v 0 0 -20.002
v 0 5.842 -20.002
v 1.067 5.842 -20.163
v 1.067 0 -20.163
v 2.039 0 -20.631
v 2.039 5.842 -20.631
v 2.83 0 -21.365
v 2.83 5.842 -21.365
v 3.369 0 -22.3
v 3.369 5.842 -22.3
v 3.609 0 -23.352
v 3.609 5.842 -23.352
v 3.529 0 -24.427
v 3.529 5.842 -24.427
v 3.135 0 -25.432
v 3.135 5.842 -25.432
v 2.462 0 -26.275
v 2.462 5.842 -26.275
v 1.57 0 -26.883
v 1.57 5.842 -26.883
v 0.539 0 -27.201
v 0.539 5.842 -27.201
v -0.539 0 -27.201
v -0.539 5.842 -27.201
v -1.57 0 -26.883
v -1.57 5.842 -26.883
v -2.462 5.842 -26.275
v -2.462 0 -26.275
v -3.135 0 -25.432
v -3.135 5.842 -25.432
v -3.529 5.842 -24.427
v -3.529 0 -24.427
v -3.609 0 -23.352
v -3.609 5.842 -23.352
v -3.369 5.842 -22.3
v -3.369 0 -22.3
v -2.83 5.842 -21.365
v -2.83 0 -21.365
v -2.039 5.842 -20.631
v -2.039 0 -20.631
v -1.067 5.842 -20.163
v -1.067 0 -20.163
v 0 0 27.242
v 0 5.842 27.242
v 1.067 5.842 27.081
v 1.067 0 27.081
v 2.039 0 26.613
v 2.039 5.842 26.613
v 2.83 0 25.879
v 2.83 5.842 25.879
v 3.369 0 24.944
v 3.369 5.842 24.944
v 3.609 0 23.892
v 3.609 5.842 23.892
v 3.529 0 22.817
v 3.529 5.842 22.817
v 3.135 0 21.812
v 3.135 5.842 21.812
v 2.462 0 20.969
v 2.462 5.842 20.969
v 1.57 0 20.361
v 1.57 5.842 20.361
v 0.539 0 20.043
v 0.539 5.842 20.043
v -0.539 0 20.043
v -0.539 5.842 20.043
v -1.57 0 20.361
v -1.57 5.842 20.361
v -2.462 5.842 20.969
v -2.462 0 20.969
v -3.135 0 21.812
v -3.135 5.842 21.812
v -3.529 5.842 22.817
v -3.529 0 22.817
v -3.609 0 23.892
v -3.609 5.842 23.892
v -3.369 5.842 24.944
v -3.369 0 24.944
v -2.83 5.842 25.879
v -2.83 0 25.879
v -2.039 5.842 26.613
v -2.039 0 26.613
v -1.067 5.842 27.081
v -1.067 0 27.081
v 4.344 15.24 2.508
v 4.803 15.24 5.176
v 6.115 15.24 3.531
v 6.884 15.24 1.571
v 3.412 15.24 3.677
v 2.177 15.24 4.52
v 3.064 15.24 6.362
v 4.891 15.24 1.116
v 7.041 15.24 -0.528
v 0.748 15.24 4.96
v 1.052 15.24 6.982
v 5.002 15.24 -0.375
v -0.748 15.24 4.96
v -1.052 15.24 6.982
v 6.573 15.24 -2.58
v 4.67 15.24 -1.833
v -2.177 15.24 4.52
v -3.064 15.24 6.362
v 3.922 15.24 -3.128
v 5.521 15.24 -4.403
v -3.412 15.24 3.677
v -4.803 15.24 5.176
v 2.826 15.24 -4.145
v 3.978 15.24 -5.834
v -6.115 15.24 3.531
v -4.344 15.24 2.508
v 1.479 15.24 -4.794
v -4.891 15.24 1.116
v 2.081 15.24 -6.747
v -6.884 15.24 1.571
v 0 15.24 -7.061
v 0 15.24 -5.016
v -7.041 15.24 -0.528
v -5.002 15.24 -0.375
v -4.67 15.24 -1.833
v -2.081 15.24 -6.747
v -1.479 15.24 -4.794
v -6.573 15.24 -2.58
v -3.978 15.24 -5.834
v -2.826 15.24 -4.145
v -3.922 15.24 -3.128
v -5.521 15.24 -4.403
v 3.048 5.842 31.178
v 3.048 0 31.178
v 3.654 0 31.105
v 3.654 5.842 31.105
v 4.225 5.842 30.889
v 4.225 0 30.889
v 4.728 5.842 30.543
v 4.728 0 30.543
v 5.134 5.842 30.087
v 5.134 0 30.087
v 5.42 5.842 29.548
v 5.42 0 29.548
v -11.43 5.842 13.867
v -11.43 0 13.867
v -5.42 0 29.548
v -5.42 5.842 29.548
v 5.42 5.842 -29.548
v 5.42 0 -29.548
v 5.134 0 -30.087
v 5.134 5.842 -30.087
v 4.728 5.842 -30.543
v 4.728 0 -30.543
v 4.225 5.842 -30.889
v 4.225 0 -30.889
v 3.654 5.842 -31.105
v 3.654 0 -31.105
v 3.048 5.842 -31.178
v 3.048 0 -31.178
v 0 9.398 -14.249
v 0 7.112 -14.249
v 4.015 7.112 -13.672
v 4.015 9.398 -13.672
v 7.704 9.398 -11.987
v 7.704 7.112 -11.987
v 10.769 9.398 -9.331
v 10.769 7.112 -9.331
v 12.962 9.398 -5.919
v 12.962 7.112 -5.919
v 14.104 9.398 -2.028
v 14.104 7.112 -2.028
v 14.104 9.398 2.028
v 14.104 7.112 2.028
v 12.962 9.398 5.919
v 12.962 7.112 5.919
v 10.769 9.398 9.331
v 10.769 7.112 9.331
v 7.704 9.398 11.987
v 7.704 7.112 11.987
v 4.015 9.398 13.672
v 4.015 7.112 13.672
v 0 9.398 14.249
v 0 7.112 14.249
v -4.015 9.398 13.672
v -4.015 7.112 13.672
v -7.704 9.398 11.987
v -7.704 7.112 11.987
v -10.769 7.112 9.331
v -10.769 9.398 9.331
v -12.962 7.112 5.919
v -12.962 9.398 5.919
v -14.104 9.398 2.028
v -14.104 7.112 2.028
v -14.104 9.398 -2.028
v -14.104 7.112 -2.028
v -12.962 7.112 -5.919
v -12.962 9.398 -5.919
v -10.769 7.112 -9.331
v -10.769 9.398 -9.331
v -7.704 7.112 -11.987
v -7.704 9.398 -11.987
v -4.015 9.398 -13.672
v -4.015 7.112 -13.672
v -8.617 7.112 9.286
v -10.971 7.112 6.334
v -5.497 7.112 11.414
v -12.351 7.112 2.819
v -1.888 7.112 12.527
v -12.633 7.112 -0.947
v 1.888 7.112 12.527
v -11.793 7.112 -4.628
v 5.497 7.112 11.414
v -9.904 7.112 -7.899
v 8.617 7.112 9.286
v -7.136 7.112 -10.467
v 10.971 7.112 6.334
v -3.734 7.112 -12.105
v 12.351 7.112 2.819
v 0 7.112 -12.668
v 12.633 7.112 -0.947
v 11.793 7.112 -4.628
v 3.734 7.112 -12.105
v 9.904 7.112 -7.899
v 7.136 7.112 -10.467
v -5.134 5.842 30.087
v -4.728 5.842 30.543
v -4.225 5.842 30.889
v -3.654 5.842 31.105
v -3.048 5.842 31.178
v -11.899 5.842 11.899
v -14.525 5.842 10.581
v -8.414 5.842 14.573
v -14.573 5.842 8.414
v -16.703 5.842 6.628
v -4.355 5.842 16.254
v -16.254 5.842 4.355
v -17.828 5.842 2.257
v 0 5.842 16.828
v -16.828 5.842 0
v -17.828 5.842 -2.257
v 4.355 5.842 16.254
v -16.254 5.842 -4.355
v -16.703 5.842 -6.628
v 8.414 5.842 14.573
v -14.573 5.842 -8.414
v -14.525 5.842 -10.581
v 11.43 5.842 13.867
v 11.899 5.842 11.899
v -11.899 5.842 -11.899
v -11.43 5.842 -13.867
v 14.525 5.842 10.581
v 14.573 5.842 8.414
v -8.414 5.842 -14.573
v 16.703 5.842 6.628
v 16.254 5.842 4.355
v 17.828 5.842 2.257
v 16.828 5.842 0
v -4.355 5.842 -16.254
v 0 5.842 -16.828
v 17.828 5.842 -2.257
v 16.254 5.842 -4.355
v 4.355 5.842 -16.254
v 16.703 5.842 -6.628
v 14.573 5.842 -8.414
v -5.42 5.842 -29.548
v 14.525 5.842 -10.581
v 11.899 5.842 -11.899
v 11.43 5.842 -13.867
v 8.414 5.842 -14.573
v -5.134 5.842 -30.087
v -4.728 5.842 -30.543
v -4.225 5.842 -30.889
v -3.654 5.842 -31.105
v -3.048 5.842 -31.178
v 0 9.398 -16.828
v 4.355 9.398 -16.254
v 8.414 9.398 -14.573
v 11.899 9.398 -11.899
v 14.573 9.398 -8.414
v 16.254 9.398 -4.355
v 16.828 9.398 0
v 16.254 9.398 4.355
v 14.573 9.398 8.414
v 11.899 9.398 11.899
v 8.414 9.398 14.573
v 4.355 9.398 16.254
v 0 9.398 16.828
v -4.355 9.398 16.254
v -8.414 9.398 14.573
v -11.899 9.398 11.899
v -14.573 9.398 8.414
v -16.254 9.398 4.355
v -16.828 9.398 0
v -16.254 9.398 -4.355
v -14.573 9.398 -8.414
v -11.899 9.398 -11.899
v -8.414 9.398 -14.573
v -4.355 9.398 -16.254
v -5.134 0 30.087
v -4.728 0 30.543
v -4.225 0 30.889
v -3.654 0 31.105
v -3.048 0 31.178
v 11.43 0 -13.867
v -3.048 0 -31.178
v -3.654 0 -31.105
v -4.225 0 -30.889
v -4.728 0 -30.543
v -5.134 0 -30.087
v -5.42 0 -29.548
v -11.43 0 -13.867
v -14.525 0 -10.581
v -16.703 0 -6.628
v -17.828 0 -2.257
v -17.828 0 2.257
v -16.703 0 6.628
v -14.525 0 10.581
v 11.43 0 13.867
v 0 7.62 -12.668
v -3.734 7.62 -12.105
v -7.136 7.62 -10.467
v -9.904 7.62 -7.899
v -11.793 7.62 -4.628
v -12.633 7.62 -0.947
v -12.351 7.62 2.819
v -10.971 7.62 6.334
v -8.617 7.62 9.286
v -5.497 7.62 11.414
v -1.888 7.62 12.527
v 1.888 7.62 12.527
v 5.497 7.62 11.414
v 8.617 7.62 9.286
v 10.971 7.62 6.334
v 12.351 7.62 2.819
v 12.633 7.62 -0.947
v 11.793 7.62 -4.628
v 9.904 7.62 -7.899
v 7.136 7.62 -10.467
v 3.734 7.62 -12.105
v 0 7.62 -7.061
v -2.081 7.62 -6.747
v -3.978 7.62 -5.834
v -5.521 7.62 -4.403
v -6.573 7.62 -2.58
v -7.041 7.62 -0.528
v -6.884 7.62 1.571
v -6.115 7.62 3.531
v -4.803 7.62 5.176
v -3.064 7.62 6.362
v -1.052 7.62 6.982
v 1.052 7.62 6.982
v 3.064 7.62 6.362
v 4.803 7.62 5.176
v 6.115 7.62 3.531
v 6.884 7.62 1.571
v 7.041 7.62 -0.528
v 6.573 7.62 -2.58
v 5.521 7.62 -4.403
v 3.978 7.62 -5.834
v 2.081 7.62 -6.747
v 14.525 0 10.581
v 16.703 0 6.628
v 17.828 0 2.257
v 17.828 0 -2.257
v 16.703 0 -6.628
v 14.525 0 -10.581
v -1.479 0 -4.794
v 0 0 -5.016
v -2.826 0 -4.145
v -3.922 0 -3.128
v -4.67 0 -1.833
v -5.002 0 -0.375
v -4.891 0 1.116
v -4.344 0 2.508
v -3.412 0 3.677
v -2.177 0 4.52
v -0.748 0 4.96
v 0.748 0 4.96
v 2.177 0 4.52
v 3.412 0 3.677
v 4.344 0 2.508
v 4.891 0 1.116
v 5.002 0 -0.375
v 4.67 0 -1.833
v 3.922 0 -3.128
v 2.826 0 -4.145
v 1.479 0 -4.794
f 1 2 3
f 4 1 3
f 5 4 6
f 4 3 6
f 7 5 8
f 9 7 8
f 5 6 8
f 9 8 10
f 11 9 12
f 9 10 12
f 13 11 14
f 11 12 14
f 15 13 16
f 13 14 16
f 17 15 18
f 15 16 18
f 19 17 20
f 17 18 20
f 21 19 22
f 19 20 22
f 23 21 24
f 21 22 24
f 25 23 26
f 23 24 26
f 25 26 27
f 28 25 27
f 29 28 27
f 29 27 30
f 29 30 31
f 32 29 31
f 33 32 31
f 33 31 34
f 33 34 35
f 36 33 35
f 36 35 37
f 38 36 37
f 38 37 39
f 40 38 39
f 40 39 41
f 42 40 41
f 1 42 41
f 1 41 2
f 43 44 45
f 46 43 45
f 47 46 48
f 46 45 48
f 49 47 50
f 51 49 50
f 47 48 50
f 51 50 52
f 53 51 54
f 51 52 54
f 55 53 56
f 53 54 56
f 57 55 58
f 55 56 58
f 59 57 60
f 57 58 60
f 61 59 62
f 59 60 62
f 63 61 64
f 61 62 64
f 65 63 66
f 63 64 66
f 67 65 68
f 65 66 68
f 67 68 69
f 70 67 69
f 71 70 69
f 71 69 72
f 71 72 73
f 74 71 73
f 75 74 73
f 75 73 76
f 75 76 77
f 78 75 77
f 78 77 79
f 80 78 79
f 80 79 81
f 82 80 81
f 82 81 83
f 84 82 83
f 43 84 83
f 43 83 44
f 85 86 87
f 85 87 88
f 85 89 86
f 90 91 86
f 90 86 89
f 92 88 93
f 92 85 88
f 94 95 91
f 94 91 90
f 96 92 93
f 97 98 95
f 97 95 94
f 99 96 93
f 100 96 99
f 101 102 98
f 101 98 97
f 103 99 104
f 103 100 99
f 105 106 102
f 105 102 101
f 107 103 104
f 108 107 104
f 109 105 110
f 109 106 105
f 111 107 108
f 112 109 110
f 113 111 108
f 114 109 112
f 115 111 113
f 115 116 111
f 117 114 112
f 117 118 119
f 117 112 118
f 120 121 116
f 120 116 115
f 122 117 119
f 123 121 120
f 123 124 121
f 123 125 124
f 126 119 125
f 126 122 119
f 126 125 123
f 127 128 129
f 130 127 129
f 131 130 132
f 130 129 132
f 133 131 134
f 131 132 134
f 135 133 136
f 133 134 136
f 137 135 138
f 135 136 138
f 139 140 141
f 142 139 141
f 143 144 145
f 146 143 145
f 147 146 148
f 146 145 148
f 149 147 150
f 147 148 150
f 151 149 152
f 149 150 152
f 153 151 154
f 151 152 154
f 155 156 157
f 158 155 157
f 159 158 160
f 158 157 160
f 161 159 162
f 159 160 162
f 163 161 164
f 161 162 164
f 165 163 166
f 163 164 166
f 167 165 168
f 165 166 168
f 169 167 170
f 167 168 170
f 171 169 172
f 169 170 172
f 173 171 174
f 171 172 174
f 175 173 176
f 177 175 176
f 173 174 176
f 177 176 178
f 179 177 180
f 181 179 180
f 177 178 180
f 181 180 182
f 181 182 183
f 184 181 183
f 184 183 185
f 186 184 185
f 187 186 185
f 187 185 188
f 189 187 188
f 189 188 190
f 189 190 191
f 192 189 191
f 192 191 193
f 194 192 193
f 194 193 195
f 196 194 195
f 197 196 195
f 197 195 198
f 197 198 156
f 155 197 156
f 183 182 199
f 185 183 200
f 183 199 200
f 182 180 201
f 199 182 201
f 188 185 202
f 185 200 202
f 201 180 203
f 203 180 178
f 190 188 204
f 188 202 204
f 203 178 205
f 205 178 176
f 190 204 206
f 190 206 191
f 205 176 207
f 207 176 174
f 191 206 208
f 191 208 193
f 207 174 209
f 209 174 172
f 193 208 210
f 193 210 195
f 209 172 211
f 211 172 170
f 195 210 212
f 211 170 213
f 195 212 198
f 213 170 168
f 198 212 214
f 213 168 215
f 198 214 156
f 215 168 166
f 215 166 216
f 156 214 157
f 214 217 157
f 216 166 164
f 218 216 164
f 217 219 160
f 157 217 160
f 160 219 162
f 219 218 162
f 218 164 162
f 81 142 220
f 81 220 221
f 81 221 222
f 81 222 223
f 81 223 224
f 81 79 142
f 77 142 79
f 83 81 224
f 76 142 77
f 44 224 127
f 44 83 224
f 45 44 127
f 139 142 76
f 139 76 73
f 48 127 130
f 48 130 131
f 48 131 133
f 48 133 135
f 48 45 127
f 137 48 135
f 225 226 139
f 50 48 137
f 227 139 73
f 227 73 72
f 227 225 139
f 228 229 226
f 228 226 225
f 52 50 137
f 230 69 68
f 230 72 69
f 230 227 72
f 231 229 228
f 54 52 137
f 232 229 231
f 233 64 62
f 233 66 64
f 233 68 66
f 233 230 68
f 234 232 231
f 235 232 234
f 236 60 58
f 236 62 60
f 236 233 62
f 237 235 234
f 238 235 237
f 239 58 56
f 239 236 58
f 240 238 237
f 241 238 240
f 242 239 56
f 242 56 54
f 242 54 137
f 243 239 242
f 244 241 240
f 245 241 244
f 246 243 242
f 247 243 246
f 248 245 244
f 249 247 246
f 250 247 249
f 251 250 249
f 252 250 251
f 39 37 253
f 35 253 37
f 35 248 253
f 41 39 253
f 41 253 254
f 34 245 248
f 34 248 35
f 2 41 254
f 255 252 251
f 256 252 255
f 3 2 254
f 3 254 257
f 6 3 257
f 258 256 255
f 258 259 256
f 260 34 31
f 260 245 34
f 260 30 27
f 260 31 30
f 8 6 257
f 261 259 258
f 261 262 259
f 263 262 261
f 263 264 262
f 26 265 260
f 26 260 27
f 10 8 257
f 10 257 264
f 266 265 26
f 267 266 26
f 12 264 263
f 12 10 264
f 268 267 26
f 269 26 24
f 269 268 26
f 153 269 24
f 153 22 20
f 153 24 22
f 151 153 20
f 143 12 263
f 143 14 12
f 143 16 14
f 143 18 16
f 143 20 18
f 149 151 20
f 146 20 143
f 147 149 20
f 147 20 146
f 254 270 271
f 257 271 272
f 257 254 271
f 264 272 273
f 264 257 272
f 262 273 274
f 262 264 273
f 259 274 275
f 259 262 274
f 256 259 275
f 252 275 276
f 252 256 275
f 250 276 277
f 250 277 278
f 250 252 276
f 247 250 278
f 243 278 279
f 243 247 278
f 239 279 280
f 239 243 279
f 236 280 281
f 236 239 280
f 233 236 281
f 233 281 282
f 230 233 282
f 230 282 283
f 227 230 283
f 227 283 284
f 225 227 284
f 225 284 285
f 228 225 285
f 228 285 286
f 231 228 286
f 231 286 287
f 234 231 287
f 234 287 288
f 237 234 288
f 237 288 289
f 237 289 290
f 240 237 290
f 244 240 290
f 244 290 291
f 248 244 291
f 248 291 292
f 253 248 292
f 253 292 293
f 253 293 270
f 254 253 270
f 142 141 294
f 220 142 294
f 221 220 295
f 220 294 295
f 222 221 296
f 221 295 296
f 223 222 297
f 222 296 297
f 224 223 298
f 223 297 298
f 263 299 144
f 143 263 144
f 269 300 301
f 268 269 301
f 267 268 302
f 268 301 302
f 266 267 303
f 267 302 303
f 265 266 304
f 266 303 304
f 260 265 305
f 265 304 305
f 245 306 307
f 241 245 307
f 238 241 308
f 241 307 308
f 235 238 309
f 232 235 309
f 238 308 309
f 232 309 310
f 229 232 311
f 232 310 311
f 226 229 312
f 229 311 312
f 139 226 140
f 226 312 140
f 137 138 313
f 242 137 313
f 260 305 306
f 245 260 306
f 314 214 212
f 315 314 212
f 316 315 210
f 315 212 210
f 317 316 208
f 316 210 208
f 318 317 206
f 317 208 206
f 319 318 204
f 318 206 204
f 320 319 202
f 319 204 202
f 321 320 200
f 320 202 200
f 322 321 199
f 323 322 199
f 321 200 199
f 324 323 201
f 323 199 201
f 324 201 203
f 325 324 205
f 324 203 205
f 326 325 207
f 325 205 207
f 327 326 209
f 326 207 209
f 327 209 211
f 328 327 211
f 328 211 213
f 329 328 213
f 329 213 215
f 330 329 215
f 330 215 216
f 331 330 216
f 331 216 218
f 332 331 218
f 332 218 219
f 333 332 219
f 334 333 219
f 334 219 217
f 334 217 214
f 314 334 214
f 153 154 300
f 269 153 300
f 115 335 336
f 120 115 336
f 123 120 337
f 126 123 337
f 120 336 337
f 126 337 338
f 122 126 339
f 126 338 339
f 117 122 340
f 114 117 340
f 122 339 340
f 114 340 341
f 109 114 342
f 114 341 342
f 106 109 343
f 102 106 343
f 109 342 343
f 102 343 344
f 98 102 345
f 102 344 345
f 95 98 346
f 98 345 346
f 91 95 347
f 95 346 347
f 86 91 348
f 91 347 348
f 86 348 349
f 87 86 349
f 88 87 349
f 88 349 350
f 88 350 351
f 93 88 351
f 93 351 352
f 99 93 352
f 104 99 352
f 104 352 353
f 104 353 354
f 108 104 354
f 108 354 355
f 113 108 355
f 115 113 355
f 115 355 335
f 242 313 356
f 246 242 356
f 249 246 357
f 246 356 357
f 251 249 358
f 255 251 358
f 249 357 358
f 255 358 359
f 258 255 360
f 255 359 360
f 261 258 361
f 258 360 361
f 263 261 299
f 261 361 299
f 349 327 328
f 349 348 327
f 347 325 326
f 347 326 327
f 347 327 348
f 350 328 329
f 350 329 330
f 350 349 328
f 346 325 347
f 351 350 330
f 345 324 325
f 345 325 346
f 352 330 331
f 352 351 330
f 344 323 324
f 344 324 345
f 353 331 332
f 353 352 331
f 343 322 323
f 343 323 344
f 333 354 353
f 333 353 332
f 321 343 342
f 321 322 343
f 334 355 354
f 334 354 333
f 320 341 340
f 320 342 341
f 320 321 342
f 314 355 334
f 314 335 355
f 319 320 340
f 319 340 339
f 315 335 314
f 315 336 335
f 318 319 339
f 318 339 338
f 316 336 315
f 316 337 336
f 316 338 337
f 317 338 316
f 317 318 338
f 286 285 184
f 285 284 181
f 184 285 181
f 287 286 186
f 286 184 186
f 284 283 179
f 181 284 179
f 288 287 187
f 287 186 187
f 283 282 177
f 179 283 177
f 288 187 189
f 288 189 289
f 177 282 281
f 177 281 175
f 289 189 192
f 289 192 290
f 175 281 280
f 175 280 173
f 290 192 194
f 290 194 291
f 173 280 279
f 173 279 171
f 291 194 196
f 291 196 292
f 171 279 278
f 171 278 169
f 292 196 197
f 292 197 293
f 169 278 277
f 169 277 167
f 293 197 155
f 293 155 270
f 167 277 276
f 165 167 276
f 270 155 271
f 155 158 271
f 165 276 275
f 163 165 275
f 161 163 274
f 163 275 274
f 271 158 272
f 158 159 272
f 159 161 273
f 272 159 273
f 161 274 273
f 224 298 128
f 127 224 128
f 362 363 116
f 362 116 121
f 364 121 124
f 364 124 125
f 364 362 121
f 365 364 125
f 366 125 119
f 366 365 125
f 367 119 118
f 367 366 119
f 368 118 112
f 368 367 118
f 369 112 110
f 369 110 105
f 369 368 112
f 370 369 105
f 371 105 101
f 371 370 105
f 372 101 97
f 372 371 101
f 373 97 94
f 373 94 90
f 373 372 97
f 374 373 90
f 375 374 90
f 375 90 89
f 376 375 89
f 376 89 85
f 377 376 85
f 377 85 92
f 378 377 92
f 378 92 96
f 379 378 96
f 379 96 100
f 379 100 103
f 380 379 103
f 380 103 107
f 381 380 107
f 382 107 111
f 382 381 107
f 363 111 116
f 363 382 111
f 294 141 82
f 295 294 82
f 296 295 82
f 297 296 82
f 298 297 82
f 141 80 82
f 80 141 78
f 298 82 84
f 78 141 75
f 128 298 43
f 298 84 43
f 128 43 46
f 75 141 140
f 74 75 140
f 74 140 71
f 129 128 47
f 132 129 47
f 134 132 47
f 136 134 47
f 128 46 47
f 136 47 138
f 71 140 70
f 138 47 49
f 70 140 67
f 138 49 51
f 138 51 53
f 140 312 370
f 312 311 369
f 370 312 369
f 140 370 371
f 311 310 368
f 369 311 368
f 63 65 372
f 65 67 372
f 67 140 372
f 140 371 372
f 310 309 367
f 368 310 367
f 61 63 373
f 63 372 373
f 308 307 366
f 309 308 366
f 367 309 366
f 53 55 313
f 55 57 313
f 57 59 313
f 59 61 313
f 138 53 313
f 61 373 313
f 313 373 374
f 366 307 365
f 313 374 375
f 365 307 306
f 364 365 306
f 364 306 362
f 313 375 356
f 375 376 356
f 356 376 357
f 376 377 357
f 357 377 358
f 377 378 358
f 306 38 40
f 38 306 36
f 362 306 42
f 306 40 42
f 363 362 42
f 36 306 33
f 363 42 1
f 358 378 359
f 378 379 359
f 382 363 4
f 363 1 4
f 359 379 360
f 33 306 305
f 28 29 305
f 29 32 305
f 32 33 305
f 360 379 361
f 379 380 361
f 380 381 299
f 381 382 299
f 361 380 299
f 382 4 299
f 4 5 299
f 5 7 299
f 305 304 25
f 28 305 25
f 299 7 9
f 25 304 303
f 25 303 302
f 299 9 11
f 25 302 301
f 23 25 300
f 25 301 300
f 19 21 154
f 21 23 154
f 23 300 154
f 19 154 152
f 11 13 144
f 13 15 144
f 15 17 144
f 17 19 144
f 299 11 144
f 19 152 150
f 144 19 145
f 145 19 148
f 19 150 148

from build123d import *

# Parameters (mm, degrees)
SKETCH1_R           = 7.0612
SKETCH1_R_2         = 5.0165
BOSS_EXTRUDE1_DEPTH = 15.24
SKETCH2_R           = 12.66825
SKETCH2_R_2         = 7.0612
BOSS_EXTRUDE2_DEPTH = 7.62
SKETCH3_R           = 14.2494
SKETCH3_R_2         = 12.66825
BOSS_EXTRUDE3_DEPTH = 7.112
SKETCH4_R           = 16.8275
SKETCH4_R_2         = 14.2494
BOSS_EXTRUDE4_DEPTH = 9.398
SKETCH5_R           = 16.8275
BOSS_EXTRUDE5_DEPTH = 5.842
CUT_EXTRUDE1_REACH  = 39.194
SKETCH6_R           = 3.6195


with BuildPart() as part:
    # Sketch1 → Boss-Extrude1 (new body)
    with BuildSketch(Plane(origin=(0, 0, 0), x_dir=(1, 0, 0), z_dir=(0, 1, 0))):
        with Locations(Location((0, 0, 0), (0, 0, 90))):
            Circle(SKETCH1_R)
        with Locations(Location((0, 0, 0), (0, 0, 90))):
            Circle(SKETCH1_R_2, mode=Mode.SUBTRACT)
    extrude(amount=BOSS_EXTRUDE1_DEPTH)

    # Sketch2 → Boss-Extrude2 (add)
    with BuildSketch(Plane(origin=(0, 0, 0), x_dir=(1, 0, 0), z_dir=(0, 1, 0))):
        with Locations(Location((0, 0, 0), (0, 0, 90))):
            Circle(SKETCH2_R)
        with Locations(Location((0, 0, 0), (0, 0, 90))):
            Circle(SKETCH2_R_2, mode=Mode.SUBTRACT)
    extrude(amount=BOSS_EXTRUDE2_DEPTH)

    # Sketch3 → Boss-Extrude3 (add)
    with BuildSketch(Plane.XZ):
        with Locations(Location((0, 0, 0), (0, 0, 270))):
            Circle(SKETCH3_R)
        with Locations(Location((0, 0, 0), (0, 0, 270))):
            Circle(SKETCH3_R_2, mode=Mode.SUBTRACT)
    extrude(amount=-BOSS_EXTRUDE3_DEPTH)

    # Sketch4 → Boss-Extrude4 (add)
    with BuildSketch(Plane.XZ):
        with Locations(Location((0, 0, 0), (0, 0, 270))):
            Circle(SKETCH4_R)
        with Locations(Location((0, 0, 0), (0, 0, 270))):
            Circle(SKETCH4_R_2, mode=Mode.SUBTRACT)
    extrude(amount=-BOSS_EXTRUDE4_DEPTH)

    # Sketch5 → Boss-Extrude5 (add)
    with BuildSketch(Plane(origin=(0, 0, 0), x_dir=(1, 0, 0), z_dir=(0, 1, 0))):
        with BuildLine():
            ThreePointArc((-11.43, 13.867010141), (-17.9705, 0), (-11.43, -13.867010141))
            Line((-11.43, -13.867010141), (-5.419746982, -29.547574395))
            ThreePointArc((-5.419746982, -29.547574395), (-4.487192662, -30.731422474), (-3.048, -31.1785))
            Line((-3.048, -31.1785), (3.048, -31.1785))
            ThreePointArc((3.048, -31.1785), (4.487192662, -30.731422474), (5.419746982, -29.547574395))
            Line((5.419746982, -29.547574395), (11.43, -13.867010141))
            ThreePointArc((11.43, -13.867010141), (17.9705, 0), (11.43, 13.867010141))
            Line((11.43, 13.867010141), (5.419746982, 29.547574395))
            ThreePointArc((5.419746982, 29.547574395), (4.487192662, 30.731422474), (3.048, 31.1785))
            Line((3.048, 31.1785), (-3.048, 31.1785))
            ThreePointArc((-3.048, 31.1785), (-4.487192662, 30.731422474), (-5.419746982, 29.547574395))
            Line((-5.419746982, 29.547574395), (-11.43, 13.867010141))
        make_face()
        with Locations(Location((0, 0, 0), (0, 0, 90))):
            Circle(SKETCH5_R, mode=Mode.SUBTRACT)
    extrude(amount=BOSS_EXTRUDE5_DEPTH)

    # Sketch6 → Cut-Extrude1 (cut, up to next)
    with BuildSketch(Plane(origin=(0, 5.842, 0), x_dir=(1, 0, 0), z_dir=(0, 1, 0)), mode=Mode.PRIVATE) as cut_extrude1_sk1:
        with Locations(Location((0, 23.622, 0), (0, 0, 270))):
            Circle(SKETCH6_R)
    cut_extrude1_tool1 = extrude(cut_extrude1_sk1.sketch, amount=-CUT_EXTRUDE1_REACH, mode=Mode.PRIVATE) & part.part
    # Sketch6 → Cut-Extrude1 (cut, up to next)
    with BuildSketch(Plane(origin=(0, 5.842, 0), x_dir=(1, 0, 0), z_dir=(0, 1, 0)), mode=Mode.PRIVATE) as cut_extrude1_sk2:
        with Locations(Location((0, -23.622, 0), (0, 0, 270))):
            Circle(SKETCH6_R)
    cut_extrude1_tool2 = extrude(cut_extrude1_sk2.sketch, amount=-CUT_EXTRUDE1_REACH, mode=Mode.PRIVATE) & part.part
    add(cut_extrude1_tool1.solids().sort_by_distance((0, 5.842, -23.622))[0], mode=Mode.SUBTRACT)
    add(cut_extrude1_tool2.solids().sort_by_distance((0, 5.842, 23.622))[0], mode=Mode.SUBTRACT)


solid = part.part
